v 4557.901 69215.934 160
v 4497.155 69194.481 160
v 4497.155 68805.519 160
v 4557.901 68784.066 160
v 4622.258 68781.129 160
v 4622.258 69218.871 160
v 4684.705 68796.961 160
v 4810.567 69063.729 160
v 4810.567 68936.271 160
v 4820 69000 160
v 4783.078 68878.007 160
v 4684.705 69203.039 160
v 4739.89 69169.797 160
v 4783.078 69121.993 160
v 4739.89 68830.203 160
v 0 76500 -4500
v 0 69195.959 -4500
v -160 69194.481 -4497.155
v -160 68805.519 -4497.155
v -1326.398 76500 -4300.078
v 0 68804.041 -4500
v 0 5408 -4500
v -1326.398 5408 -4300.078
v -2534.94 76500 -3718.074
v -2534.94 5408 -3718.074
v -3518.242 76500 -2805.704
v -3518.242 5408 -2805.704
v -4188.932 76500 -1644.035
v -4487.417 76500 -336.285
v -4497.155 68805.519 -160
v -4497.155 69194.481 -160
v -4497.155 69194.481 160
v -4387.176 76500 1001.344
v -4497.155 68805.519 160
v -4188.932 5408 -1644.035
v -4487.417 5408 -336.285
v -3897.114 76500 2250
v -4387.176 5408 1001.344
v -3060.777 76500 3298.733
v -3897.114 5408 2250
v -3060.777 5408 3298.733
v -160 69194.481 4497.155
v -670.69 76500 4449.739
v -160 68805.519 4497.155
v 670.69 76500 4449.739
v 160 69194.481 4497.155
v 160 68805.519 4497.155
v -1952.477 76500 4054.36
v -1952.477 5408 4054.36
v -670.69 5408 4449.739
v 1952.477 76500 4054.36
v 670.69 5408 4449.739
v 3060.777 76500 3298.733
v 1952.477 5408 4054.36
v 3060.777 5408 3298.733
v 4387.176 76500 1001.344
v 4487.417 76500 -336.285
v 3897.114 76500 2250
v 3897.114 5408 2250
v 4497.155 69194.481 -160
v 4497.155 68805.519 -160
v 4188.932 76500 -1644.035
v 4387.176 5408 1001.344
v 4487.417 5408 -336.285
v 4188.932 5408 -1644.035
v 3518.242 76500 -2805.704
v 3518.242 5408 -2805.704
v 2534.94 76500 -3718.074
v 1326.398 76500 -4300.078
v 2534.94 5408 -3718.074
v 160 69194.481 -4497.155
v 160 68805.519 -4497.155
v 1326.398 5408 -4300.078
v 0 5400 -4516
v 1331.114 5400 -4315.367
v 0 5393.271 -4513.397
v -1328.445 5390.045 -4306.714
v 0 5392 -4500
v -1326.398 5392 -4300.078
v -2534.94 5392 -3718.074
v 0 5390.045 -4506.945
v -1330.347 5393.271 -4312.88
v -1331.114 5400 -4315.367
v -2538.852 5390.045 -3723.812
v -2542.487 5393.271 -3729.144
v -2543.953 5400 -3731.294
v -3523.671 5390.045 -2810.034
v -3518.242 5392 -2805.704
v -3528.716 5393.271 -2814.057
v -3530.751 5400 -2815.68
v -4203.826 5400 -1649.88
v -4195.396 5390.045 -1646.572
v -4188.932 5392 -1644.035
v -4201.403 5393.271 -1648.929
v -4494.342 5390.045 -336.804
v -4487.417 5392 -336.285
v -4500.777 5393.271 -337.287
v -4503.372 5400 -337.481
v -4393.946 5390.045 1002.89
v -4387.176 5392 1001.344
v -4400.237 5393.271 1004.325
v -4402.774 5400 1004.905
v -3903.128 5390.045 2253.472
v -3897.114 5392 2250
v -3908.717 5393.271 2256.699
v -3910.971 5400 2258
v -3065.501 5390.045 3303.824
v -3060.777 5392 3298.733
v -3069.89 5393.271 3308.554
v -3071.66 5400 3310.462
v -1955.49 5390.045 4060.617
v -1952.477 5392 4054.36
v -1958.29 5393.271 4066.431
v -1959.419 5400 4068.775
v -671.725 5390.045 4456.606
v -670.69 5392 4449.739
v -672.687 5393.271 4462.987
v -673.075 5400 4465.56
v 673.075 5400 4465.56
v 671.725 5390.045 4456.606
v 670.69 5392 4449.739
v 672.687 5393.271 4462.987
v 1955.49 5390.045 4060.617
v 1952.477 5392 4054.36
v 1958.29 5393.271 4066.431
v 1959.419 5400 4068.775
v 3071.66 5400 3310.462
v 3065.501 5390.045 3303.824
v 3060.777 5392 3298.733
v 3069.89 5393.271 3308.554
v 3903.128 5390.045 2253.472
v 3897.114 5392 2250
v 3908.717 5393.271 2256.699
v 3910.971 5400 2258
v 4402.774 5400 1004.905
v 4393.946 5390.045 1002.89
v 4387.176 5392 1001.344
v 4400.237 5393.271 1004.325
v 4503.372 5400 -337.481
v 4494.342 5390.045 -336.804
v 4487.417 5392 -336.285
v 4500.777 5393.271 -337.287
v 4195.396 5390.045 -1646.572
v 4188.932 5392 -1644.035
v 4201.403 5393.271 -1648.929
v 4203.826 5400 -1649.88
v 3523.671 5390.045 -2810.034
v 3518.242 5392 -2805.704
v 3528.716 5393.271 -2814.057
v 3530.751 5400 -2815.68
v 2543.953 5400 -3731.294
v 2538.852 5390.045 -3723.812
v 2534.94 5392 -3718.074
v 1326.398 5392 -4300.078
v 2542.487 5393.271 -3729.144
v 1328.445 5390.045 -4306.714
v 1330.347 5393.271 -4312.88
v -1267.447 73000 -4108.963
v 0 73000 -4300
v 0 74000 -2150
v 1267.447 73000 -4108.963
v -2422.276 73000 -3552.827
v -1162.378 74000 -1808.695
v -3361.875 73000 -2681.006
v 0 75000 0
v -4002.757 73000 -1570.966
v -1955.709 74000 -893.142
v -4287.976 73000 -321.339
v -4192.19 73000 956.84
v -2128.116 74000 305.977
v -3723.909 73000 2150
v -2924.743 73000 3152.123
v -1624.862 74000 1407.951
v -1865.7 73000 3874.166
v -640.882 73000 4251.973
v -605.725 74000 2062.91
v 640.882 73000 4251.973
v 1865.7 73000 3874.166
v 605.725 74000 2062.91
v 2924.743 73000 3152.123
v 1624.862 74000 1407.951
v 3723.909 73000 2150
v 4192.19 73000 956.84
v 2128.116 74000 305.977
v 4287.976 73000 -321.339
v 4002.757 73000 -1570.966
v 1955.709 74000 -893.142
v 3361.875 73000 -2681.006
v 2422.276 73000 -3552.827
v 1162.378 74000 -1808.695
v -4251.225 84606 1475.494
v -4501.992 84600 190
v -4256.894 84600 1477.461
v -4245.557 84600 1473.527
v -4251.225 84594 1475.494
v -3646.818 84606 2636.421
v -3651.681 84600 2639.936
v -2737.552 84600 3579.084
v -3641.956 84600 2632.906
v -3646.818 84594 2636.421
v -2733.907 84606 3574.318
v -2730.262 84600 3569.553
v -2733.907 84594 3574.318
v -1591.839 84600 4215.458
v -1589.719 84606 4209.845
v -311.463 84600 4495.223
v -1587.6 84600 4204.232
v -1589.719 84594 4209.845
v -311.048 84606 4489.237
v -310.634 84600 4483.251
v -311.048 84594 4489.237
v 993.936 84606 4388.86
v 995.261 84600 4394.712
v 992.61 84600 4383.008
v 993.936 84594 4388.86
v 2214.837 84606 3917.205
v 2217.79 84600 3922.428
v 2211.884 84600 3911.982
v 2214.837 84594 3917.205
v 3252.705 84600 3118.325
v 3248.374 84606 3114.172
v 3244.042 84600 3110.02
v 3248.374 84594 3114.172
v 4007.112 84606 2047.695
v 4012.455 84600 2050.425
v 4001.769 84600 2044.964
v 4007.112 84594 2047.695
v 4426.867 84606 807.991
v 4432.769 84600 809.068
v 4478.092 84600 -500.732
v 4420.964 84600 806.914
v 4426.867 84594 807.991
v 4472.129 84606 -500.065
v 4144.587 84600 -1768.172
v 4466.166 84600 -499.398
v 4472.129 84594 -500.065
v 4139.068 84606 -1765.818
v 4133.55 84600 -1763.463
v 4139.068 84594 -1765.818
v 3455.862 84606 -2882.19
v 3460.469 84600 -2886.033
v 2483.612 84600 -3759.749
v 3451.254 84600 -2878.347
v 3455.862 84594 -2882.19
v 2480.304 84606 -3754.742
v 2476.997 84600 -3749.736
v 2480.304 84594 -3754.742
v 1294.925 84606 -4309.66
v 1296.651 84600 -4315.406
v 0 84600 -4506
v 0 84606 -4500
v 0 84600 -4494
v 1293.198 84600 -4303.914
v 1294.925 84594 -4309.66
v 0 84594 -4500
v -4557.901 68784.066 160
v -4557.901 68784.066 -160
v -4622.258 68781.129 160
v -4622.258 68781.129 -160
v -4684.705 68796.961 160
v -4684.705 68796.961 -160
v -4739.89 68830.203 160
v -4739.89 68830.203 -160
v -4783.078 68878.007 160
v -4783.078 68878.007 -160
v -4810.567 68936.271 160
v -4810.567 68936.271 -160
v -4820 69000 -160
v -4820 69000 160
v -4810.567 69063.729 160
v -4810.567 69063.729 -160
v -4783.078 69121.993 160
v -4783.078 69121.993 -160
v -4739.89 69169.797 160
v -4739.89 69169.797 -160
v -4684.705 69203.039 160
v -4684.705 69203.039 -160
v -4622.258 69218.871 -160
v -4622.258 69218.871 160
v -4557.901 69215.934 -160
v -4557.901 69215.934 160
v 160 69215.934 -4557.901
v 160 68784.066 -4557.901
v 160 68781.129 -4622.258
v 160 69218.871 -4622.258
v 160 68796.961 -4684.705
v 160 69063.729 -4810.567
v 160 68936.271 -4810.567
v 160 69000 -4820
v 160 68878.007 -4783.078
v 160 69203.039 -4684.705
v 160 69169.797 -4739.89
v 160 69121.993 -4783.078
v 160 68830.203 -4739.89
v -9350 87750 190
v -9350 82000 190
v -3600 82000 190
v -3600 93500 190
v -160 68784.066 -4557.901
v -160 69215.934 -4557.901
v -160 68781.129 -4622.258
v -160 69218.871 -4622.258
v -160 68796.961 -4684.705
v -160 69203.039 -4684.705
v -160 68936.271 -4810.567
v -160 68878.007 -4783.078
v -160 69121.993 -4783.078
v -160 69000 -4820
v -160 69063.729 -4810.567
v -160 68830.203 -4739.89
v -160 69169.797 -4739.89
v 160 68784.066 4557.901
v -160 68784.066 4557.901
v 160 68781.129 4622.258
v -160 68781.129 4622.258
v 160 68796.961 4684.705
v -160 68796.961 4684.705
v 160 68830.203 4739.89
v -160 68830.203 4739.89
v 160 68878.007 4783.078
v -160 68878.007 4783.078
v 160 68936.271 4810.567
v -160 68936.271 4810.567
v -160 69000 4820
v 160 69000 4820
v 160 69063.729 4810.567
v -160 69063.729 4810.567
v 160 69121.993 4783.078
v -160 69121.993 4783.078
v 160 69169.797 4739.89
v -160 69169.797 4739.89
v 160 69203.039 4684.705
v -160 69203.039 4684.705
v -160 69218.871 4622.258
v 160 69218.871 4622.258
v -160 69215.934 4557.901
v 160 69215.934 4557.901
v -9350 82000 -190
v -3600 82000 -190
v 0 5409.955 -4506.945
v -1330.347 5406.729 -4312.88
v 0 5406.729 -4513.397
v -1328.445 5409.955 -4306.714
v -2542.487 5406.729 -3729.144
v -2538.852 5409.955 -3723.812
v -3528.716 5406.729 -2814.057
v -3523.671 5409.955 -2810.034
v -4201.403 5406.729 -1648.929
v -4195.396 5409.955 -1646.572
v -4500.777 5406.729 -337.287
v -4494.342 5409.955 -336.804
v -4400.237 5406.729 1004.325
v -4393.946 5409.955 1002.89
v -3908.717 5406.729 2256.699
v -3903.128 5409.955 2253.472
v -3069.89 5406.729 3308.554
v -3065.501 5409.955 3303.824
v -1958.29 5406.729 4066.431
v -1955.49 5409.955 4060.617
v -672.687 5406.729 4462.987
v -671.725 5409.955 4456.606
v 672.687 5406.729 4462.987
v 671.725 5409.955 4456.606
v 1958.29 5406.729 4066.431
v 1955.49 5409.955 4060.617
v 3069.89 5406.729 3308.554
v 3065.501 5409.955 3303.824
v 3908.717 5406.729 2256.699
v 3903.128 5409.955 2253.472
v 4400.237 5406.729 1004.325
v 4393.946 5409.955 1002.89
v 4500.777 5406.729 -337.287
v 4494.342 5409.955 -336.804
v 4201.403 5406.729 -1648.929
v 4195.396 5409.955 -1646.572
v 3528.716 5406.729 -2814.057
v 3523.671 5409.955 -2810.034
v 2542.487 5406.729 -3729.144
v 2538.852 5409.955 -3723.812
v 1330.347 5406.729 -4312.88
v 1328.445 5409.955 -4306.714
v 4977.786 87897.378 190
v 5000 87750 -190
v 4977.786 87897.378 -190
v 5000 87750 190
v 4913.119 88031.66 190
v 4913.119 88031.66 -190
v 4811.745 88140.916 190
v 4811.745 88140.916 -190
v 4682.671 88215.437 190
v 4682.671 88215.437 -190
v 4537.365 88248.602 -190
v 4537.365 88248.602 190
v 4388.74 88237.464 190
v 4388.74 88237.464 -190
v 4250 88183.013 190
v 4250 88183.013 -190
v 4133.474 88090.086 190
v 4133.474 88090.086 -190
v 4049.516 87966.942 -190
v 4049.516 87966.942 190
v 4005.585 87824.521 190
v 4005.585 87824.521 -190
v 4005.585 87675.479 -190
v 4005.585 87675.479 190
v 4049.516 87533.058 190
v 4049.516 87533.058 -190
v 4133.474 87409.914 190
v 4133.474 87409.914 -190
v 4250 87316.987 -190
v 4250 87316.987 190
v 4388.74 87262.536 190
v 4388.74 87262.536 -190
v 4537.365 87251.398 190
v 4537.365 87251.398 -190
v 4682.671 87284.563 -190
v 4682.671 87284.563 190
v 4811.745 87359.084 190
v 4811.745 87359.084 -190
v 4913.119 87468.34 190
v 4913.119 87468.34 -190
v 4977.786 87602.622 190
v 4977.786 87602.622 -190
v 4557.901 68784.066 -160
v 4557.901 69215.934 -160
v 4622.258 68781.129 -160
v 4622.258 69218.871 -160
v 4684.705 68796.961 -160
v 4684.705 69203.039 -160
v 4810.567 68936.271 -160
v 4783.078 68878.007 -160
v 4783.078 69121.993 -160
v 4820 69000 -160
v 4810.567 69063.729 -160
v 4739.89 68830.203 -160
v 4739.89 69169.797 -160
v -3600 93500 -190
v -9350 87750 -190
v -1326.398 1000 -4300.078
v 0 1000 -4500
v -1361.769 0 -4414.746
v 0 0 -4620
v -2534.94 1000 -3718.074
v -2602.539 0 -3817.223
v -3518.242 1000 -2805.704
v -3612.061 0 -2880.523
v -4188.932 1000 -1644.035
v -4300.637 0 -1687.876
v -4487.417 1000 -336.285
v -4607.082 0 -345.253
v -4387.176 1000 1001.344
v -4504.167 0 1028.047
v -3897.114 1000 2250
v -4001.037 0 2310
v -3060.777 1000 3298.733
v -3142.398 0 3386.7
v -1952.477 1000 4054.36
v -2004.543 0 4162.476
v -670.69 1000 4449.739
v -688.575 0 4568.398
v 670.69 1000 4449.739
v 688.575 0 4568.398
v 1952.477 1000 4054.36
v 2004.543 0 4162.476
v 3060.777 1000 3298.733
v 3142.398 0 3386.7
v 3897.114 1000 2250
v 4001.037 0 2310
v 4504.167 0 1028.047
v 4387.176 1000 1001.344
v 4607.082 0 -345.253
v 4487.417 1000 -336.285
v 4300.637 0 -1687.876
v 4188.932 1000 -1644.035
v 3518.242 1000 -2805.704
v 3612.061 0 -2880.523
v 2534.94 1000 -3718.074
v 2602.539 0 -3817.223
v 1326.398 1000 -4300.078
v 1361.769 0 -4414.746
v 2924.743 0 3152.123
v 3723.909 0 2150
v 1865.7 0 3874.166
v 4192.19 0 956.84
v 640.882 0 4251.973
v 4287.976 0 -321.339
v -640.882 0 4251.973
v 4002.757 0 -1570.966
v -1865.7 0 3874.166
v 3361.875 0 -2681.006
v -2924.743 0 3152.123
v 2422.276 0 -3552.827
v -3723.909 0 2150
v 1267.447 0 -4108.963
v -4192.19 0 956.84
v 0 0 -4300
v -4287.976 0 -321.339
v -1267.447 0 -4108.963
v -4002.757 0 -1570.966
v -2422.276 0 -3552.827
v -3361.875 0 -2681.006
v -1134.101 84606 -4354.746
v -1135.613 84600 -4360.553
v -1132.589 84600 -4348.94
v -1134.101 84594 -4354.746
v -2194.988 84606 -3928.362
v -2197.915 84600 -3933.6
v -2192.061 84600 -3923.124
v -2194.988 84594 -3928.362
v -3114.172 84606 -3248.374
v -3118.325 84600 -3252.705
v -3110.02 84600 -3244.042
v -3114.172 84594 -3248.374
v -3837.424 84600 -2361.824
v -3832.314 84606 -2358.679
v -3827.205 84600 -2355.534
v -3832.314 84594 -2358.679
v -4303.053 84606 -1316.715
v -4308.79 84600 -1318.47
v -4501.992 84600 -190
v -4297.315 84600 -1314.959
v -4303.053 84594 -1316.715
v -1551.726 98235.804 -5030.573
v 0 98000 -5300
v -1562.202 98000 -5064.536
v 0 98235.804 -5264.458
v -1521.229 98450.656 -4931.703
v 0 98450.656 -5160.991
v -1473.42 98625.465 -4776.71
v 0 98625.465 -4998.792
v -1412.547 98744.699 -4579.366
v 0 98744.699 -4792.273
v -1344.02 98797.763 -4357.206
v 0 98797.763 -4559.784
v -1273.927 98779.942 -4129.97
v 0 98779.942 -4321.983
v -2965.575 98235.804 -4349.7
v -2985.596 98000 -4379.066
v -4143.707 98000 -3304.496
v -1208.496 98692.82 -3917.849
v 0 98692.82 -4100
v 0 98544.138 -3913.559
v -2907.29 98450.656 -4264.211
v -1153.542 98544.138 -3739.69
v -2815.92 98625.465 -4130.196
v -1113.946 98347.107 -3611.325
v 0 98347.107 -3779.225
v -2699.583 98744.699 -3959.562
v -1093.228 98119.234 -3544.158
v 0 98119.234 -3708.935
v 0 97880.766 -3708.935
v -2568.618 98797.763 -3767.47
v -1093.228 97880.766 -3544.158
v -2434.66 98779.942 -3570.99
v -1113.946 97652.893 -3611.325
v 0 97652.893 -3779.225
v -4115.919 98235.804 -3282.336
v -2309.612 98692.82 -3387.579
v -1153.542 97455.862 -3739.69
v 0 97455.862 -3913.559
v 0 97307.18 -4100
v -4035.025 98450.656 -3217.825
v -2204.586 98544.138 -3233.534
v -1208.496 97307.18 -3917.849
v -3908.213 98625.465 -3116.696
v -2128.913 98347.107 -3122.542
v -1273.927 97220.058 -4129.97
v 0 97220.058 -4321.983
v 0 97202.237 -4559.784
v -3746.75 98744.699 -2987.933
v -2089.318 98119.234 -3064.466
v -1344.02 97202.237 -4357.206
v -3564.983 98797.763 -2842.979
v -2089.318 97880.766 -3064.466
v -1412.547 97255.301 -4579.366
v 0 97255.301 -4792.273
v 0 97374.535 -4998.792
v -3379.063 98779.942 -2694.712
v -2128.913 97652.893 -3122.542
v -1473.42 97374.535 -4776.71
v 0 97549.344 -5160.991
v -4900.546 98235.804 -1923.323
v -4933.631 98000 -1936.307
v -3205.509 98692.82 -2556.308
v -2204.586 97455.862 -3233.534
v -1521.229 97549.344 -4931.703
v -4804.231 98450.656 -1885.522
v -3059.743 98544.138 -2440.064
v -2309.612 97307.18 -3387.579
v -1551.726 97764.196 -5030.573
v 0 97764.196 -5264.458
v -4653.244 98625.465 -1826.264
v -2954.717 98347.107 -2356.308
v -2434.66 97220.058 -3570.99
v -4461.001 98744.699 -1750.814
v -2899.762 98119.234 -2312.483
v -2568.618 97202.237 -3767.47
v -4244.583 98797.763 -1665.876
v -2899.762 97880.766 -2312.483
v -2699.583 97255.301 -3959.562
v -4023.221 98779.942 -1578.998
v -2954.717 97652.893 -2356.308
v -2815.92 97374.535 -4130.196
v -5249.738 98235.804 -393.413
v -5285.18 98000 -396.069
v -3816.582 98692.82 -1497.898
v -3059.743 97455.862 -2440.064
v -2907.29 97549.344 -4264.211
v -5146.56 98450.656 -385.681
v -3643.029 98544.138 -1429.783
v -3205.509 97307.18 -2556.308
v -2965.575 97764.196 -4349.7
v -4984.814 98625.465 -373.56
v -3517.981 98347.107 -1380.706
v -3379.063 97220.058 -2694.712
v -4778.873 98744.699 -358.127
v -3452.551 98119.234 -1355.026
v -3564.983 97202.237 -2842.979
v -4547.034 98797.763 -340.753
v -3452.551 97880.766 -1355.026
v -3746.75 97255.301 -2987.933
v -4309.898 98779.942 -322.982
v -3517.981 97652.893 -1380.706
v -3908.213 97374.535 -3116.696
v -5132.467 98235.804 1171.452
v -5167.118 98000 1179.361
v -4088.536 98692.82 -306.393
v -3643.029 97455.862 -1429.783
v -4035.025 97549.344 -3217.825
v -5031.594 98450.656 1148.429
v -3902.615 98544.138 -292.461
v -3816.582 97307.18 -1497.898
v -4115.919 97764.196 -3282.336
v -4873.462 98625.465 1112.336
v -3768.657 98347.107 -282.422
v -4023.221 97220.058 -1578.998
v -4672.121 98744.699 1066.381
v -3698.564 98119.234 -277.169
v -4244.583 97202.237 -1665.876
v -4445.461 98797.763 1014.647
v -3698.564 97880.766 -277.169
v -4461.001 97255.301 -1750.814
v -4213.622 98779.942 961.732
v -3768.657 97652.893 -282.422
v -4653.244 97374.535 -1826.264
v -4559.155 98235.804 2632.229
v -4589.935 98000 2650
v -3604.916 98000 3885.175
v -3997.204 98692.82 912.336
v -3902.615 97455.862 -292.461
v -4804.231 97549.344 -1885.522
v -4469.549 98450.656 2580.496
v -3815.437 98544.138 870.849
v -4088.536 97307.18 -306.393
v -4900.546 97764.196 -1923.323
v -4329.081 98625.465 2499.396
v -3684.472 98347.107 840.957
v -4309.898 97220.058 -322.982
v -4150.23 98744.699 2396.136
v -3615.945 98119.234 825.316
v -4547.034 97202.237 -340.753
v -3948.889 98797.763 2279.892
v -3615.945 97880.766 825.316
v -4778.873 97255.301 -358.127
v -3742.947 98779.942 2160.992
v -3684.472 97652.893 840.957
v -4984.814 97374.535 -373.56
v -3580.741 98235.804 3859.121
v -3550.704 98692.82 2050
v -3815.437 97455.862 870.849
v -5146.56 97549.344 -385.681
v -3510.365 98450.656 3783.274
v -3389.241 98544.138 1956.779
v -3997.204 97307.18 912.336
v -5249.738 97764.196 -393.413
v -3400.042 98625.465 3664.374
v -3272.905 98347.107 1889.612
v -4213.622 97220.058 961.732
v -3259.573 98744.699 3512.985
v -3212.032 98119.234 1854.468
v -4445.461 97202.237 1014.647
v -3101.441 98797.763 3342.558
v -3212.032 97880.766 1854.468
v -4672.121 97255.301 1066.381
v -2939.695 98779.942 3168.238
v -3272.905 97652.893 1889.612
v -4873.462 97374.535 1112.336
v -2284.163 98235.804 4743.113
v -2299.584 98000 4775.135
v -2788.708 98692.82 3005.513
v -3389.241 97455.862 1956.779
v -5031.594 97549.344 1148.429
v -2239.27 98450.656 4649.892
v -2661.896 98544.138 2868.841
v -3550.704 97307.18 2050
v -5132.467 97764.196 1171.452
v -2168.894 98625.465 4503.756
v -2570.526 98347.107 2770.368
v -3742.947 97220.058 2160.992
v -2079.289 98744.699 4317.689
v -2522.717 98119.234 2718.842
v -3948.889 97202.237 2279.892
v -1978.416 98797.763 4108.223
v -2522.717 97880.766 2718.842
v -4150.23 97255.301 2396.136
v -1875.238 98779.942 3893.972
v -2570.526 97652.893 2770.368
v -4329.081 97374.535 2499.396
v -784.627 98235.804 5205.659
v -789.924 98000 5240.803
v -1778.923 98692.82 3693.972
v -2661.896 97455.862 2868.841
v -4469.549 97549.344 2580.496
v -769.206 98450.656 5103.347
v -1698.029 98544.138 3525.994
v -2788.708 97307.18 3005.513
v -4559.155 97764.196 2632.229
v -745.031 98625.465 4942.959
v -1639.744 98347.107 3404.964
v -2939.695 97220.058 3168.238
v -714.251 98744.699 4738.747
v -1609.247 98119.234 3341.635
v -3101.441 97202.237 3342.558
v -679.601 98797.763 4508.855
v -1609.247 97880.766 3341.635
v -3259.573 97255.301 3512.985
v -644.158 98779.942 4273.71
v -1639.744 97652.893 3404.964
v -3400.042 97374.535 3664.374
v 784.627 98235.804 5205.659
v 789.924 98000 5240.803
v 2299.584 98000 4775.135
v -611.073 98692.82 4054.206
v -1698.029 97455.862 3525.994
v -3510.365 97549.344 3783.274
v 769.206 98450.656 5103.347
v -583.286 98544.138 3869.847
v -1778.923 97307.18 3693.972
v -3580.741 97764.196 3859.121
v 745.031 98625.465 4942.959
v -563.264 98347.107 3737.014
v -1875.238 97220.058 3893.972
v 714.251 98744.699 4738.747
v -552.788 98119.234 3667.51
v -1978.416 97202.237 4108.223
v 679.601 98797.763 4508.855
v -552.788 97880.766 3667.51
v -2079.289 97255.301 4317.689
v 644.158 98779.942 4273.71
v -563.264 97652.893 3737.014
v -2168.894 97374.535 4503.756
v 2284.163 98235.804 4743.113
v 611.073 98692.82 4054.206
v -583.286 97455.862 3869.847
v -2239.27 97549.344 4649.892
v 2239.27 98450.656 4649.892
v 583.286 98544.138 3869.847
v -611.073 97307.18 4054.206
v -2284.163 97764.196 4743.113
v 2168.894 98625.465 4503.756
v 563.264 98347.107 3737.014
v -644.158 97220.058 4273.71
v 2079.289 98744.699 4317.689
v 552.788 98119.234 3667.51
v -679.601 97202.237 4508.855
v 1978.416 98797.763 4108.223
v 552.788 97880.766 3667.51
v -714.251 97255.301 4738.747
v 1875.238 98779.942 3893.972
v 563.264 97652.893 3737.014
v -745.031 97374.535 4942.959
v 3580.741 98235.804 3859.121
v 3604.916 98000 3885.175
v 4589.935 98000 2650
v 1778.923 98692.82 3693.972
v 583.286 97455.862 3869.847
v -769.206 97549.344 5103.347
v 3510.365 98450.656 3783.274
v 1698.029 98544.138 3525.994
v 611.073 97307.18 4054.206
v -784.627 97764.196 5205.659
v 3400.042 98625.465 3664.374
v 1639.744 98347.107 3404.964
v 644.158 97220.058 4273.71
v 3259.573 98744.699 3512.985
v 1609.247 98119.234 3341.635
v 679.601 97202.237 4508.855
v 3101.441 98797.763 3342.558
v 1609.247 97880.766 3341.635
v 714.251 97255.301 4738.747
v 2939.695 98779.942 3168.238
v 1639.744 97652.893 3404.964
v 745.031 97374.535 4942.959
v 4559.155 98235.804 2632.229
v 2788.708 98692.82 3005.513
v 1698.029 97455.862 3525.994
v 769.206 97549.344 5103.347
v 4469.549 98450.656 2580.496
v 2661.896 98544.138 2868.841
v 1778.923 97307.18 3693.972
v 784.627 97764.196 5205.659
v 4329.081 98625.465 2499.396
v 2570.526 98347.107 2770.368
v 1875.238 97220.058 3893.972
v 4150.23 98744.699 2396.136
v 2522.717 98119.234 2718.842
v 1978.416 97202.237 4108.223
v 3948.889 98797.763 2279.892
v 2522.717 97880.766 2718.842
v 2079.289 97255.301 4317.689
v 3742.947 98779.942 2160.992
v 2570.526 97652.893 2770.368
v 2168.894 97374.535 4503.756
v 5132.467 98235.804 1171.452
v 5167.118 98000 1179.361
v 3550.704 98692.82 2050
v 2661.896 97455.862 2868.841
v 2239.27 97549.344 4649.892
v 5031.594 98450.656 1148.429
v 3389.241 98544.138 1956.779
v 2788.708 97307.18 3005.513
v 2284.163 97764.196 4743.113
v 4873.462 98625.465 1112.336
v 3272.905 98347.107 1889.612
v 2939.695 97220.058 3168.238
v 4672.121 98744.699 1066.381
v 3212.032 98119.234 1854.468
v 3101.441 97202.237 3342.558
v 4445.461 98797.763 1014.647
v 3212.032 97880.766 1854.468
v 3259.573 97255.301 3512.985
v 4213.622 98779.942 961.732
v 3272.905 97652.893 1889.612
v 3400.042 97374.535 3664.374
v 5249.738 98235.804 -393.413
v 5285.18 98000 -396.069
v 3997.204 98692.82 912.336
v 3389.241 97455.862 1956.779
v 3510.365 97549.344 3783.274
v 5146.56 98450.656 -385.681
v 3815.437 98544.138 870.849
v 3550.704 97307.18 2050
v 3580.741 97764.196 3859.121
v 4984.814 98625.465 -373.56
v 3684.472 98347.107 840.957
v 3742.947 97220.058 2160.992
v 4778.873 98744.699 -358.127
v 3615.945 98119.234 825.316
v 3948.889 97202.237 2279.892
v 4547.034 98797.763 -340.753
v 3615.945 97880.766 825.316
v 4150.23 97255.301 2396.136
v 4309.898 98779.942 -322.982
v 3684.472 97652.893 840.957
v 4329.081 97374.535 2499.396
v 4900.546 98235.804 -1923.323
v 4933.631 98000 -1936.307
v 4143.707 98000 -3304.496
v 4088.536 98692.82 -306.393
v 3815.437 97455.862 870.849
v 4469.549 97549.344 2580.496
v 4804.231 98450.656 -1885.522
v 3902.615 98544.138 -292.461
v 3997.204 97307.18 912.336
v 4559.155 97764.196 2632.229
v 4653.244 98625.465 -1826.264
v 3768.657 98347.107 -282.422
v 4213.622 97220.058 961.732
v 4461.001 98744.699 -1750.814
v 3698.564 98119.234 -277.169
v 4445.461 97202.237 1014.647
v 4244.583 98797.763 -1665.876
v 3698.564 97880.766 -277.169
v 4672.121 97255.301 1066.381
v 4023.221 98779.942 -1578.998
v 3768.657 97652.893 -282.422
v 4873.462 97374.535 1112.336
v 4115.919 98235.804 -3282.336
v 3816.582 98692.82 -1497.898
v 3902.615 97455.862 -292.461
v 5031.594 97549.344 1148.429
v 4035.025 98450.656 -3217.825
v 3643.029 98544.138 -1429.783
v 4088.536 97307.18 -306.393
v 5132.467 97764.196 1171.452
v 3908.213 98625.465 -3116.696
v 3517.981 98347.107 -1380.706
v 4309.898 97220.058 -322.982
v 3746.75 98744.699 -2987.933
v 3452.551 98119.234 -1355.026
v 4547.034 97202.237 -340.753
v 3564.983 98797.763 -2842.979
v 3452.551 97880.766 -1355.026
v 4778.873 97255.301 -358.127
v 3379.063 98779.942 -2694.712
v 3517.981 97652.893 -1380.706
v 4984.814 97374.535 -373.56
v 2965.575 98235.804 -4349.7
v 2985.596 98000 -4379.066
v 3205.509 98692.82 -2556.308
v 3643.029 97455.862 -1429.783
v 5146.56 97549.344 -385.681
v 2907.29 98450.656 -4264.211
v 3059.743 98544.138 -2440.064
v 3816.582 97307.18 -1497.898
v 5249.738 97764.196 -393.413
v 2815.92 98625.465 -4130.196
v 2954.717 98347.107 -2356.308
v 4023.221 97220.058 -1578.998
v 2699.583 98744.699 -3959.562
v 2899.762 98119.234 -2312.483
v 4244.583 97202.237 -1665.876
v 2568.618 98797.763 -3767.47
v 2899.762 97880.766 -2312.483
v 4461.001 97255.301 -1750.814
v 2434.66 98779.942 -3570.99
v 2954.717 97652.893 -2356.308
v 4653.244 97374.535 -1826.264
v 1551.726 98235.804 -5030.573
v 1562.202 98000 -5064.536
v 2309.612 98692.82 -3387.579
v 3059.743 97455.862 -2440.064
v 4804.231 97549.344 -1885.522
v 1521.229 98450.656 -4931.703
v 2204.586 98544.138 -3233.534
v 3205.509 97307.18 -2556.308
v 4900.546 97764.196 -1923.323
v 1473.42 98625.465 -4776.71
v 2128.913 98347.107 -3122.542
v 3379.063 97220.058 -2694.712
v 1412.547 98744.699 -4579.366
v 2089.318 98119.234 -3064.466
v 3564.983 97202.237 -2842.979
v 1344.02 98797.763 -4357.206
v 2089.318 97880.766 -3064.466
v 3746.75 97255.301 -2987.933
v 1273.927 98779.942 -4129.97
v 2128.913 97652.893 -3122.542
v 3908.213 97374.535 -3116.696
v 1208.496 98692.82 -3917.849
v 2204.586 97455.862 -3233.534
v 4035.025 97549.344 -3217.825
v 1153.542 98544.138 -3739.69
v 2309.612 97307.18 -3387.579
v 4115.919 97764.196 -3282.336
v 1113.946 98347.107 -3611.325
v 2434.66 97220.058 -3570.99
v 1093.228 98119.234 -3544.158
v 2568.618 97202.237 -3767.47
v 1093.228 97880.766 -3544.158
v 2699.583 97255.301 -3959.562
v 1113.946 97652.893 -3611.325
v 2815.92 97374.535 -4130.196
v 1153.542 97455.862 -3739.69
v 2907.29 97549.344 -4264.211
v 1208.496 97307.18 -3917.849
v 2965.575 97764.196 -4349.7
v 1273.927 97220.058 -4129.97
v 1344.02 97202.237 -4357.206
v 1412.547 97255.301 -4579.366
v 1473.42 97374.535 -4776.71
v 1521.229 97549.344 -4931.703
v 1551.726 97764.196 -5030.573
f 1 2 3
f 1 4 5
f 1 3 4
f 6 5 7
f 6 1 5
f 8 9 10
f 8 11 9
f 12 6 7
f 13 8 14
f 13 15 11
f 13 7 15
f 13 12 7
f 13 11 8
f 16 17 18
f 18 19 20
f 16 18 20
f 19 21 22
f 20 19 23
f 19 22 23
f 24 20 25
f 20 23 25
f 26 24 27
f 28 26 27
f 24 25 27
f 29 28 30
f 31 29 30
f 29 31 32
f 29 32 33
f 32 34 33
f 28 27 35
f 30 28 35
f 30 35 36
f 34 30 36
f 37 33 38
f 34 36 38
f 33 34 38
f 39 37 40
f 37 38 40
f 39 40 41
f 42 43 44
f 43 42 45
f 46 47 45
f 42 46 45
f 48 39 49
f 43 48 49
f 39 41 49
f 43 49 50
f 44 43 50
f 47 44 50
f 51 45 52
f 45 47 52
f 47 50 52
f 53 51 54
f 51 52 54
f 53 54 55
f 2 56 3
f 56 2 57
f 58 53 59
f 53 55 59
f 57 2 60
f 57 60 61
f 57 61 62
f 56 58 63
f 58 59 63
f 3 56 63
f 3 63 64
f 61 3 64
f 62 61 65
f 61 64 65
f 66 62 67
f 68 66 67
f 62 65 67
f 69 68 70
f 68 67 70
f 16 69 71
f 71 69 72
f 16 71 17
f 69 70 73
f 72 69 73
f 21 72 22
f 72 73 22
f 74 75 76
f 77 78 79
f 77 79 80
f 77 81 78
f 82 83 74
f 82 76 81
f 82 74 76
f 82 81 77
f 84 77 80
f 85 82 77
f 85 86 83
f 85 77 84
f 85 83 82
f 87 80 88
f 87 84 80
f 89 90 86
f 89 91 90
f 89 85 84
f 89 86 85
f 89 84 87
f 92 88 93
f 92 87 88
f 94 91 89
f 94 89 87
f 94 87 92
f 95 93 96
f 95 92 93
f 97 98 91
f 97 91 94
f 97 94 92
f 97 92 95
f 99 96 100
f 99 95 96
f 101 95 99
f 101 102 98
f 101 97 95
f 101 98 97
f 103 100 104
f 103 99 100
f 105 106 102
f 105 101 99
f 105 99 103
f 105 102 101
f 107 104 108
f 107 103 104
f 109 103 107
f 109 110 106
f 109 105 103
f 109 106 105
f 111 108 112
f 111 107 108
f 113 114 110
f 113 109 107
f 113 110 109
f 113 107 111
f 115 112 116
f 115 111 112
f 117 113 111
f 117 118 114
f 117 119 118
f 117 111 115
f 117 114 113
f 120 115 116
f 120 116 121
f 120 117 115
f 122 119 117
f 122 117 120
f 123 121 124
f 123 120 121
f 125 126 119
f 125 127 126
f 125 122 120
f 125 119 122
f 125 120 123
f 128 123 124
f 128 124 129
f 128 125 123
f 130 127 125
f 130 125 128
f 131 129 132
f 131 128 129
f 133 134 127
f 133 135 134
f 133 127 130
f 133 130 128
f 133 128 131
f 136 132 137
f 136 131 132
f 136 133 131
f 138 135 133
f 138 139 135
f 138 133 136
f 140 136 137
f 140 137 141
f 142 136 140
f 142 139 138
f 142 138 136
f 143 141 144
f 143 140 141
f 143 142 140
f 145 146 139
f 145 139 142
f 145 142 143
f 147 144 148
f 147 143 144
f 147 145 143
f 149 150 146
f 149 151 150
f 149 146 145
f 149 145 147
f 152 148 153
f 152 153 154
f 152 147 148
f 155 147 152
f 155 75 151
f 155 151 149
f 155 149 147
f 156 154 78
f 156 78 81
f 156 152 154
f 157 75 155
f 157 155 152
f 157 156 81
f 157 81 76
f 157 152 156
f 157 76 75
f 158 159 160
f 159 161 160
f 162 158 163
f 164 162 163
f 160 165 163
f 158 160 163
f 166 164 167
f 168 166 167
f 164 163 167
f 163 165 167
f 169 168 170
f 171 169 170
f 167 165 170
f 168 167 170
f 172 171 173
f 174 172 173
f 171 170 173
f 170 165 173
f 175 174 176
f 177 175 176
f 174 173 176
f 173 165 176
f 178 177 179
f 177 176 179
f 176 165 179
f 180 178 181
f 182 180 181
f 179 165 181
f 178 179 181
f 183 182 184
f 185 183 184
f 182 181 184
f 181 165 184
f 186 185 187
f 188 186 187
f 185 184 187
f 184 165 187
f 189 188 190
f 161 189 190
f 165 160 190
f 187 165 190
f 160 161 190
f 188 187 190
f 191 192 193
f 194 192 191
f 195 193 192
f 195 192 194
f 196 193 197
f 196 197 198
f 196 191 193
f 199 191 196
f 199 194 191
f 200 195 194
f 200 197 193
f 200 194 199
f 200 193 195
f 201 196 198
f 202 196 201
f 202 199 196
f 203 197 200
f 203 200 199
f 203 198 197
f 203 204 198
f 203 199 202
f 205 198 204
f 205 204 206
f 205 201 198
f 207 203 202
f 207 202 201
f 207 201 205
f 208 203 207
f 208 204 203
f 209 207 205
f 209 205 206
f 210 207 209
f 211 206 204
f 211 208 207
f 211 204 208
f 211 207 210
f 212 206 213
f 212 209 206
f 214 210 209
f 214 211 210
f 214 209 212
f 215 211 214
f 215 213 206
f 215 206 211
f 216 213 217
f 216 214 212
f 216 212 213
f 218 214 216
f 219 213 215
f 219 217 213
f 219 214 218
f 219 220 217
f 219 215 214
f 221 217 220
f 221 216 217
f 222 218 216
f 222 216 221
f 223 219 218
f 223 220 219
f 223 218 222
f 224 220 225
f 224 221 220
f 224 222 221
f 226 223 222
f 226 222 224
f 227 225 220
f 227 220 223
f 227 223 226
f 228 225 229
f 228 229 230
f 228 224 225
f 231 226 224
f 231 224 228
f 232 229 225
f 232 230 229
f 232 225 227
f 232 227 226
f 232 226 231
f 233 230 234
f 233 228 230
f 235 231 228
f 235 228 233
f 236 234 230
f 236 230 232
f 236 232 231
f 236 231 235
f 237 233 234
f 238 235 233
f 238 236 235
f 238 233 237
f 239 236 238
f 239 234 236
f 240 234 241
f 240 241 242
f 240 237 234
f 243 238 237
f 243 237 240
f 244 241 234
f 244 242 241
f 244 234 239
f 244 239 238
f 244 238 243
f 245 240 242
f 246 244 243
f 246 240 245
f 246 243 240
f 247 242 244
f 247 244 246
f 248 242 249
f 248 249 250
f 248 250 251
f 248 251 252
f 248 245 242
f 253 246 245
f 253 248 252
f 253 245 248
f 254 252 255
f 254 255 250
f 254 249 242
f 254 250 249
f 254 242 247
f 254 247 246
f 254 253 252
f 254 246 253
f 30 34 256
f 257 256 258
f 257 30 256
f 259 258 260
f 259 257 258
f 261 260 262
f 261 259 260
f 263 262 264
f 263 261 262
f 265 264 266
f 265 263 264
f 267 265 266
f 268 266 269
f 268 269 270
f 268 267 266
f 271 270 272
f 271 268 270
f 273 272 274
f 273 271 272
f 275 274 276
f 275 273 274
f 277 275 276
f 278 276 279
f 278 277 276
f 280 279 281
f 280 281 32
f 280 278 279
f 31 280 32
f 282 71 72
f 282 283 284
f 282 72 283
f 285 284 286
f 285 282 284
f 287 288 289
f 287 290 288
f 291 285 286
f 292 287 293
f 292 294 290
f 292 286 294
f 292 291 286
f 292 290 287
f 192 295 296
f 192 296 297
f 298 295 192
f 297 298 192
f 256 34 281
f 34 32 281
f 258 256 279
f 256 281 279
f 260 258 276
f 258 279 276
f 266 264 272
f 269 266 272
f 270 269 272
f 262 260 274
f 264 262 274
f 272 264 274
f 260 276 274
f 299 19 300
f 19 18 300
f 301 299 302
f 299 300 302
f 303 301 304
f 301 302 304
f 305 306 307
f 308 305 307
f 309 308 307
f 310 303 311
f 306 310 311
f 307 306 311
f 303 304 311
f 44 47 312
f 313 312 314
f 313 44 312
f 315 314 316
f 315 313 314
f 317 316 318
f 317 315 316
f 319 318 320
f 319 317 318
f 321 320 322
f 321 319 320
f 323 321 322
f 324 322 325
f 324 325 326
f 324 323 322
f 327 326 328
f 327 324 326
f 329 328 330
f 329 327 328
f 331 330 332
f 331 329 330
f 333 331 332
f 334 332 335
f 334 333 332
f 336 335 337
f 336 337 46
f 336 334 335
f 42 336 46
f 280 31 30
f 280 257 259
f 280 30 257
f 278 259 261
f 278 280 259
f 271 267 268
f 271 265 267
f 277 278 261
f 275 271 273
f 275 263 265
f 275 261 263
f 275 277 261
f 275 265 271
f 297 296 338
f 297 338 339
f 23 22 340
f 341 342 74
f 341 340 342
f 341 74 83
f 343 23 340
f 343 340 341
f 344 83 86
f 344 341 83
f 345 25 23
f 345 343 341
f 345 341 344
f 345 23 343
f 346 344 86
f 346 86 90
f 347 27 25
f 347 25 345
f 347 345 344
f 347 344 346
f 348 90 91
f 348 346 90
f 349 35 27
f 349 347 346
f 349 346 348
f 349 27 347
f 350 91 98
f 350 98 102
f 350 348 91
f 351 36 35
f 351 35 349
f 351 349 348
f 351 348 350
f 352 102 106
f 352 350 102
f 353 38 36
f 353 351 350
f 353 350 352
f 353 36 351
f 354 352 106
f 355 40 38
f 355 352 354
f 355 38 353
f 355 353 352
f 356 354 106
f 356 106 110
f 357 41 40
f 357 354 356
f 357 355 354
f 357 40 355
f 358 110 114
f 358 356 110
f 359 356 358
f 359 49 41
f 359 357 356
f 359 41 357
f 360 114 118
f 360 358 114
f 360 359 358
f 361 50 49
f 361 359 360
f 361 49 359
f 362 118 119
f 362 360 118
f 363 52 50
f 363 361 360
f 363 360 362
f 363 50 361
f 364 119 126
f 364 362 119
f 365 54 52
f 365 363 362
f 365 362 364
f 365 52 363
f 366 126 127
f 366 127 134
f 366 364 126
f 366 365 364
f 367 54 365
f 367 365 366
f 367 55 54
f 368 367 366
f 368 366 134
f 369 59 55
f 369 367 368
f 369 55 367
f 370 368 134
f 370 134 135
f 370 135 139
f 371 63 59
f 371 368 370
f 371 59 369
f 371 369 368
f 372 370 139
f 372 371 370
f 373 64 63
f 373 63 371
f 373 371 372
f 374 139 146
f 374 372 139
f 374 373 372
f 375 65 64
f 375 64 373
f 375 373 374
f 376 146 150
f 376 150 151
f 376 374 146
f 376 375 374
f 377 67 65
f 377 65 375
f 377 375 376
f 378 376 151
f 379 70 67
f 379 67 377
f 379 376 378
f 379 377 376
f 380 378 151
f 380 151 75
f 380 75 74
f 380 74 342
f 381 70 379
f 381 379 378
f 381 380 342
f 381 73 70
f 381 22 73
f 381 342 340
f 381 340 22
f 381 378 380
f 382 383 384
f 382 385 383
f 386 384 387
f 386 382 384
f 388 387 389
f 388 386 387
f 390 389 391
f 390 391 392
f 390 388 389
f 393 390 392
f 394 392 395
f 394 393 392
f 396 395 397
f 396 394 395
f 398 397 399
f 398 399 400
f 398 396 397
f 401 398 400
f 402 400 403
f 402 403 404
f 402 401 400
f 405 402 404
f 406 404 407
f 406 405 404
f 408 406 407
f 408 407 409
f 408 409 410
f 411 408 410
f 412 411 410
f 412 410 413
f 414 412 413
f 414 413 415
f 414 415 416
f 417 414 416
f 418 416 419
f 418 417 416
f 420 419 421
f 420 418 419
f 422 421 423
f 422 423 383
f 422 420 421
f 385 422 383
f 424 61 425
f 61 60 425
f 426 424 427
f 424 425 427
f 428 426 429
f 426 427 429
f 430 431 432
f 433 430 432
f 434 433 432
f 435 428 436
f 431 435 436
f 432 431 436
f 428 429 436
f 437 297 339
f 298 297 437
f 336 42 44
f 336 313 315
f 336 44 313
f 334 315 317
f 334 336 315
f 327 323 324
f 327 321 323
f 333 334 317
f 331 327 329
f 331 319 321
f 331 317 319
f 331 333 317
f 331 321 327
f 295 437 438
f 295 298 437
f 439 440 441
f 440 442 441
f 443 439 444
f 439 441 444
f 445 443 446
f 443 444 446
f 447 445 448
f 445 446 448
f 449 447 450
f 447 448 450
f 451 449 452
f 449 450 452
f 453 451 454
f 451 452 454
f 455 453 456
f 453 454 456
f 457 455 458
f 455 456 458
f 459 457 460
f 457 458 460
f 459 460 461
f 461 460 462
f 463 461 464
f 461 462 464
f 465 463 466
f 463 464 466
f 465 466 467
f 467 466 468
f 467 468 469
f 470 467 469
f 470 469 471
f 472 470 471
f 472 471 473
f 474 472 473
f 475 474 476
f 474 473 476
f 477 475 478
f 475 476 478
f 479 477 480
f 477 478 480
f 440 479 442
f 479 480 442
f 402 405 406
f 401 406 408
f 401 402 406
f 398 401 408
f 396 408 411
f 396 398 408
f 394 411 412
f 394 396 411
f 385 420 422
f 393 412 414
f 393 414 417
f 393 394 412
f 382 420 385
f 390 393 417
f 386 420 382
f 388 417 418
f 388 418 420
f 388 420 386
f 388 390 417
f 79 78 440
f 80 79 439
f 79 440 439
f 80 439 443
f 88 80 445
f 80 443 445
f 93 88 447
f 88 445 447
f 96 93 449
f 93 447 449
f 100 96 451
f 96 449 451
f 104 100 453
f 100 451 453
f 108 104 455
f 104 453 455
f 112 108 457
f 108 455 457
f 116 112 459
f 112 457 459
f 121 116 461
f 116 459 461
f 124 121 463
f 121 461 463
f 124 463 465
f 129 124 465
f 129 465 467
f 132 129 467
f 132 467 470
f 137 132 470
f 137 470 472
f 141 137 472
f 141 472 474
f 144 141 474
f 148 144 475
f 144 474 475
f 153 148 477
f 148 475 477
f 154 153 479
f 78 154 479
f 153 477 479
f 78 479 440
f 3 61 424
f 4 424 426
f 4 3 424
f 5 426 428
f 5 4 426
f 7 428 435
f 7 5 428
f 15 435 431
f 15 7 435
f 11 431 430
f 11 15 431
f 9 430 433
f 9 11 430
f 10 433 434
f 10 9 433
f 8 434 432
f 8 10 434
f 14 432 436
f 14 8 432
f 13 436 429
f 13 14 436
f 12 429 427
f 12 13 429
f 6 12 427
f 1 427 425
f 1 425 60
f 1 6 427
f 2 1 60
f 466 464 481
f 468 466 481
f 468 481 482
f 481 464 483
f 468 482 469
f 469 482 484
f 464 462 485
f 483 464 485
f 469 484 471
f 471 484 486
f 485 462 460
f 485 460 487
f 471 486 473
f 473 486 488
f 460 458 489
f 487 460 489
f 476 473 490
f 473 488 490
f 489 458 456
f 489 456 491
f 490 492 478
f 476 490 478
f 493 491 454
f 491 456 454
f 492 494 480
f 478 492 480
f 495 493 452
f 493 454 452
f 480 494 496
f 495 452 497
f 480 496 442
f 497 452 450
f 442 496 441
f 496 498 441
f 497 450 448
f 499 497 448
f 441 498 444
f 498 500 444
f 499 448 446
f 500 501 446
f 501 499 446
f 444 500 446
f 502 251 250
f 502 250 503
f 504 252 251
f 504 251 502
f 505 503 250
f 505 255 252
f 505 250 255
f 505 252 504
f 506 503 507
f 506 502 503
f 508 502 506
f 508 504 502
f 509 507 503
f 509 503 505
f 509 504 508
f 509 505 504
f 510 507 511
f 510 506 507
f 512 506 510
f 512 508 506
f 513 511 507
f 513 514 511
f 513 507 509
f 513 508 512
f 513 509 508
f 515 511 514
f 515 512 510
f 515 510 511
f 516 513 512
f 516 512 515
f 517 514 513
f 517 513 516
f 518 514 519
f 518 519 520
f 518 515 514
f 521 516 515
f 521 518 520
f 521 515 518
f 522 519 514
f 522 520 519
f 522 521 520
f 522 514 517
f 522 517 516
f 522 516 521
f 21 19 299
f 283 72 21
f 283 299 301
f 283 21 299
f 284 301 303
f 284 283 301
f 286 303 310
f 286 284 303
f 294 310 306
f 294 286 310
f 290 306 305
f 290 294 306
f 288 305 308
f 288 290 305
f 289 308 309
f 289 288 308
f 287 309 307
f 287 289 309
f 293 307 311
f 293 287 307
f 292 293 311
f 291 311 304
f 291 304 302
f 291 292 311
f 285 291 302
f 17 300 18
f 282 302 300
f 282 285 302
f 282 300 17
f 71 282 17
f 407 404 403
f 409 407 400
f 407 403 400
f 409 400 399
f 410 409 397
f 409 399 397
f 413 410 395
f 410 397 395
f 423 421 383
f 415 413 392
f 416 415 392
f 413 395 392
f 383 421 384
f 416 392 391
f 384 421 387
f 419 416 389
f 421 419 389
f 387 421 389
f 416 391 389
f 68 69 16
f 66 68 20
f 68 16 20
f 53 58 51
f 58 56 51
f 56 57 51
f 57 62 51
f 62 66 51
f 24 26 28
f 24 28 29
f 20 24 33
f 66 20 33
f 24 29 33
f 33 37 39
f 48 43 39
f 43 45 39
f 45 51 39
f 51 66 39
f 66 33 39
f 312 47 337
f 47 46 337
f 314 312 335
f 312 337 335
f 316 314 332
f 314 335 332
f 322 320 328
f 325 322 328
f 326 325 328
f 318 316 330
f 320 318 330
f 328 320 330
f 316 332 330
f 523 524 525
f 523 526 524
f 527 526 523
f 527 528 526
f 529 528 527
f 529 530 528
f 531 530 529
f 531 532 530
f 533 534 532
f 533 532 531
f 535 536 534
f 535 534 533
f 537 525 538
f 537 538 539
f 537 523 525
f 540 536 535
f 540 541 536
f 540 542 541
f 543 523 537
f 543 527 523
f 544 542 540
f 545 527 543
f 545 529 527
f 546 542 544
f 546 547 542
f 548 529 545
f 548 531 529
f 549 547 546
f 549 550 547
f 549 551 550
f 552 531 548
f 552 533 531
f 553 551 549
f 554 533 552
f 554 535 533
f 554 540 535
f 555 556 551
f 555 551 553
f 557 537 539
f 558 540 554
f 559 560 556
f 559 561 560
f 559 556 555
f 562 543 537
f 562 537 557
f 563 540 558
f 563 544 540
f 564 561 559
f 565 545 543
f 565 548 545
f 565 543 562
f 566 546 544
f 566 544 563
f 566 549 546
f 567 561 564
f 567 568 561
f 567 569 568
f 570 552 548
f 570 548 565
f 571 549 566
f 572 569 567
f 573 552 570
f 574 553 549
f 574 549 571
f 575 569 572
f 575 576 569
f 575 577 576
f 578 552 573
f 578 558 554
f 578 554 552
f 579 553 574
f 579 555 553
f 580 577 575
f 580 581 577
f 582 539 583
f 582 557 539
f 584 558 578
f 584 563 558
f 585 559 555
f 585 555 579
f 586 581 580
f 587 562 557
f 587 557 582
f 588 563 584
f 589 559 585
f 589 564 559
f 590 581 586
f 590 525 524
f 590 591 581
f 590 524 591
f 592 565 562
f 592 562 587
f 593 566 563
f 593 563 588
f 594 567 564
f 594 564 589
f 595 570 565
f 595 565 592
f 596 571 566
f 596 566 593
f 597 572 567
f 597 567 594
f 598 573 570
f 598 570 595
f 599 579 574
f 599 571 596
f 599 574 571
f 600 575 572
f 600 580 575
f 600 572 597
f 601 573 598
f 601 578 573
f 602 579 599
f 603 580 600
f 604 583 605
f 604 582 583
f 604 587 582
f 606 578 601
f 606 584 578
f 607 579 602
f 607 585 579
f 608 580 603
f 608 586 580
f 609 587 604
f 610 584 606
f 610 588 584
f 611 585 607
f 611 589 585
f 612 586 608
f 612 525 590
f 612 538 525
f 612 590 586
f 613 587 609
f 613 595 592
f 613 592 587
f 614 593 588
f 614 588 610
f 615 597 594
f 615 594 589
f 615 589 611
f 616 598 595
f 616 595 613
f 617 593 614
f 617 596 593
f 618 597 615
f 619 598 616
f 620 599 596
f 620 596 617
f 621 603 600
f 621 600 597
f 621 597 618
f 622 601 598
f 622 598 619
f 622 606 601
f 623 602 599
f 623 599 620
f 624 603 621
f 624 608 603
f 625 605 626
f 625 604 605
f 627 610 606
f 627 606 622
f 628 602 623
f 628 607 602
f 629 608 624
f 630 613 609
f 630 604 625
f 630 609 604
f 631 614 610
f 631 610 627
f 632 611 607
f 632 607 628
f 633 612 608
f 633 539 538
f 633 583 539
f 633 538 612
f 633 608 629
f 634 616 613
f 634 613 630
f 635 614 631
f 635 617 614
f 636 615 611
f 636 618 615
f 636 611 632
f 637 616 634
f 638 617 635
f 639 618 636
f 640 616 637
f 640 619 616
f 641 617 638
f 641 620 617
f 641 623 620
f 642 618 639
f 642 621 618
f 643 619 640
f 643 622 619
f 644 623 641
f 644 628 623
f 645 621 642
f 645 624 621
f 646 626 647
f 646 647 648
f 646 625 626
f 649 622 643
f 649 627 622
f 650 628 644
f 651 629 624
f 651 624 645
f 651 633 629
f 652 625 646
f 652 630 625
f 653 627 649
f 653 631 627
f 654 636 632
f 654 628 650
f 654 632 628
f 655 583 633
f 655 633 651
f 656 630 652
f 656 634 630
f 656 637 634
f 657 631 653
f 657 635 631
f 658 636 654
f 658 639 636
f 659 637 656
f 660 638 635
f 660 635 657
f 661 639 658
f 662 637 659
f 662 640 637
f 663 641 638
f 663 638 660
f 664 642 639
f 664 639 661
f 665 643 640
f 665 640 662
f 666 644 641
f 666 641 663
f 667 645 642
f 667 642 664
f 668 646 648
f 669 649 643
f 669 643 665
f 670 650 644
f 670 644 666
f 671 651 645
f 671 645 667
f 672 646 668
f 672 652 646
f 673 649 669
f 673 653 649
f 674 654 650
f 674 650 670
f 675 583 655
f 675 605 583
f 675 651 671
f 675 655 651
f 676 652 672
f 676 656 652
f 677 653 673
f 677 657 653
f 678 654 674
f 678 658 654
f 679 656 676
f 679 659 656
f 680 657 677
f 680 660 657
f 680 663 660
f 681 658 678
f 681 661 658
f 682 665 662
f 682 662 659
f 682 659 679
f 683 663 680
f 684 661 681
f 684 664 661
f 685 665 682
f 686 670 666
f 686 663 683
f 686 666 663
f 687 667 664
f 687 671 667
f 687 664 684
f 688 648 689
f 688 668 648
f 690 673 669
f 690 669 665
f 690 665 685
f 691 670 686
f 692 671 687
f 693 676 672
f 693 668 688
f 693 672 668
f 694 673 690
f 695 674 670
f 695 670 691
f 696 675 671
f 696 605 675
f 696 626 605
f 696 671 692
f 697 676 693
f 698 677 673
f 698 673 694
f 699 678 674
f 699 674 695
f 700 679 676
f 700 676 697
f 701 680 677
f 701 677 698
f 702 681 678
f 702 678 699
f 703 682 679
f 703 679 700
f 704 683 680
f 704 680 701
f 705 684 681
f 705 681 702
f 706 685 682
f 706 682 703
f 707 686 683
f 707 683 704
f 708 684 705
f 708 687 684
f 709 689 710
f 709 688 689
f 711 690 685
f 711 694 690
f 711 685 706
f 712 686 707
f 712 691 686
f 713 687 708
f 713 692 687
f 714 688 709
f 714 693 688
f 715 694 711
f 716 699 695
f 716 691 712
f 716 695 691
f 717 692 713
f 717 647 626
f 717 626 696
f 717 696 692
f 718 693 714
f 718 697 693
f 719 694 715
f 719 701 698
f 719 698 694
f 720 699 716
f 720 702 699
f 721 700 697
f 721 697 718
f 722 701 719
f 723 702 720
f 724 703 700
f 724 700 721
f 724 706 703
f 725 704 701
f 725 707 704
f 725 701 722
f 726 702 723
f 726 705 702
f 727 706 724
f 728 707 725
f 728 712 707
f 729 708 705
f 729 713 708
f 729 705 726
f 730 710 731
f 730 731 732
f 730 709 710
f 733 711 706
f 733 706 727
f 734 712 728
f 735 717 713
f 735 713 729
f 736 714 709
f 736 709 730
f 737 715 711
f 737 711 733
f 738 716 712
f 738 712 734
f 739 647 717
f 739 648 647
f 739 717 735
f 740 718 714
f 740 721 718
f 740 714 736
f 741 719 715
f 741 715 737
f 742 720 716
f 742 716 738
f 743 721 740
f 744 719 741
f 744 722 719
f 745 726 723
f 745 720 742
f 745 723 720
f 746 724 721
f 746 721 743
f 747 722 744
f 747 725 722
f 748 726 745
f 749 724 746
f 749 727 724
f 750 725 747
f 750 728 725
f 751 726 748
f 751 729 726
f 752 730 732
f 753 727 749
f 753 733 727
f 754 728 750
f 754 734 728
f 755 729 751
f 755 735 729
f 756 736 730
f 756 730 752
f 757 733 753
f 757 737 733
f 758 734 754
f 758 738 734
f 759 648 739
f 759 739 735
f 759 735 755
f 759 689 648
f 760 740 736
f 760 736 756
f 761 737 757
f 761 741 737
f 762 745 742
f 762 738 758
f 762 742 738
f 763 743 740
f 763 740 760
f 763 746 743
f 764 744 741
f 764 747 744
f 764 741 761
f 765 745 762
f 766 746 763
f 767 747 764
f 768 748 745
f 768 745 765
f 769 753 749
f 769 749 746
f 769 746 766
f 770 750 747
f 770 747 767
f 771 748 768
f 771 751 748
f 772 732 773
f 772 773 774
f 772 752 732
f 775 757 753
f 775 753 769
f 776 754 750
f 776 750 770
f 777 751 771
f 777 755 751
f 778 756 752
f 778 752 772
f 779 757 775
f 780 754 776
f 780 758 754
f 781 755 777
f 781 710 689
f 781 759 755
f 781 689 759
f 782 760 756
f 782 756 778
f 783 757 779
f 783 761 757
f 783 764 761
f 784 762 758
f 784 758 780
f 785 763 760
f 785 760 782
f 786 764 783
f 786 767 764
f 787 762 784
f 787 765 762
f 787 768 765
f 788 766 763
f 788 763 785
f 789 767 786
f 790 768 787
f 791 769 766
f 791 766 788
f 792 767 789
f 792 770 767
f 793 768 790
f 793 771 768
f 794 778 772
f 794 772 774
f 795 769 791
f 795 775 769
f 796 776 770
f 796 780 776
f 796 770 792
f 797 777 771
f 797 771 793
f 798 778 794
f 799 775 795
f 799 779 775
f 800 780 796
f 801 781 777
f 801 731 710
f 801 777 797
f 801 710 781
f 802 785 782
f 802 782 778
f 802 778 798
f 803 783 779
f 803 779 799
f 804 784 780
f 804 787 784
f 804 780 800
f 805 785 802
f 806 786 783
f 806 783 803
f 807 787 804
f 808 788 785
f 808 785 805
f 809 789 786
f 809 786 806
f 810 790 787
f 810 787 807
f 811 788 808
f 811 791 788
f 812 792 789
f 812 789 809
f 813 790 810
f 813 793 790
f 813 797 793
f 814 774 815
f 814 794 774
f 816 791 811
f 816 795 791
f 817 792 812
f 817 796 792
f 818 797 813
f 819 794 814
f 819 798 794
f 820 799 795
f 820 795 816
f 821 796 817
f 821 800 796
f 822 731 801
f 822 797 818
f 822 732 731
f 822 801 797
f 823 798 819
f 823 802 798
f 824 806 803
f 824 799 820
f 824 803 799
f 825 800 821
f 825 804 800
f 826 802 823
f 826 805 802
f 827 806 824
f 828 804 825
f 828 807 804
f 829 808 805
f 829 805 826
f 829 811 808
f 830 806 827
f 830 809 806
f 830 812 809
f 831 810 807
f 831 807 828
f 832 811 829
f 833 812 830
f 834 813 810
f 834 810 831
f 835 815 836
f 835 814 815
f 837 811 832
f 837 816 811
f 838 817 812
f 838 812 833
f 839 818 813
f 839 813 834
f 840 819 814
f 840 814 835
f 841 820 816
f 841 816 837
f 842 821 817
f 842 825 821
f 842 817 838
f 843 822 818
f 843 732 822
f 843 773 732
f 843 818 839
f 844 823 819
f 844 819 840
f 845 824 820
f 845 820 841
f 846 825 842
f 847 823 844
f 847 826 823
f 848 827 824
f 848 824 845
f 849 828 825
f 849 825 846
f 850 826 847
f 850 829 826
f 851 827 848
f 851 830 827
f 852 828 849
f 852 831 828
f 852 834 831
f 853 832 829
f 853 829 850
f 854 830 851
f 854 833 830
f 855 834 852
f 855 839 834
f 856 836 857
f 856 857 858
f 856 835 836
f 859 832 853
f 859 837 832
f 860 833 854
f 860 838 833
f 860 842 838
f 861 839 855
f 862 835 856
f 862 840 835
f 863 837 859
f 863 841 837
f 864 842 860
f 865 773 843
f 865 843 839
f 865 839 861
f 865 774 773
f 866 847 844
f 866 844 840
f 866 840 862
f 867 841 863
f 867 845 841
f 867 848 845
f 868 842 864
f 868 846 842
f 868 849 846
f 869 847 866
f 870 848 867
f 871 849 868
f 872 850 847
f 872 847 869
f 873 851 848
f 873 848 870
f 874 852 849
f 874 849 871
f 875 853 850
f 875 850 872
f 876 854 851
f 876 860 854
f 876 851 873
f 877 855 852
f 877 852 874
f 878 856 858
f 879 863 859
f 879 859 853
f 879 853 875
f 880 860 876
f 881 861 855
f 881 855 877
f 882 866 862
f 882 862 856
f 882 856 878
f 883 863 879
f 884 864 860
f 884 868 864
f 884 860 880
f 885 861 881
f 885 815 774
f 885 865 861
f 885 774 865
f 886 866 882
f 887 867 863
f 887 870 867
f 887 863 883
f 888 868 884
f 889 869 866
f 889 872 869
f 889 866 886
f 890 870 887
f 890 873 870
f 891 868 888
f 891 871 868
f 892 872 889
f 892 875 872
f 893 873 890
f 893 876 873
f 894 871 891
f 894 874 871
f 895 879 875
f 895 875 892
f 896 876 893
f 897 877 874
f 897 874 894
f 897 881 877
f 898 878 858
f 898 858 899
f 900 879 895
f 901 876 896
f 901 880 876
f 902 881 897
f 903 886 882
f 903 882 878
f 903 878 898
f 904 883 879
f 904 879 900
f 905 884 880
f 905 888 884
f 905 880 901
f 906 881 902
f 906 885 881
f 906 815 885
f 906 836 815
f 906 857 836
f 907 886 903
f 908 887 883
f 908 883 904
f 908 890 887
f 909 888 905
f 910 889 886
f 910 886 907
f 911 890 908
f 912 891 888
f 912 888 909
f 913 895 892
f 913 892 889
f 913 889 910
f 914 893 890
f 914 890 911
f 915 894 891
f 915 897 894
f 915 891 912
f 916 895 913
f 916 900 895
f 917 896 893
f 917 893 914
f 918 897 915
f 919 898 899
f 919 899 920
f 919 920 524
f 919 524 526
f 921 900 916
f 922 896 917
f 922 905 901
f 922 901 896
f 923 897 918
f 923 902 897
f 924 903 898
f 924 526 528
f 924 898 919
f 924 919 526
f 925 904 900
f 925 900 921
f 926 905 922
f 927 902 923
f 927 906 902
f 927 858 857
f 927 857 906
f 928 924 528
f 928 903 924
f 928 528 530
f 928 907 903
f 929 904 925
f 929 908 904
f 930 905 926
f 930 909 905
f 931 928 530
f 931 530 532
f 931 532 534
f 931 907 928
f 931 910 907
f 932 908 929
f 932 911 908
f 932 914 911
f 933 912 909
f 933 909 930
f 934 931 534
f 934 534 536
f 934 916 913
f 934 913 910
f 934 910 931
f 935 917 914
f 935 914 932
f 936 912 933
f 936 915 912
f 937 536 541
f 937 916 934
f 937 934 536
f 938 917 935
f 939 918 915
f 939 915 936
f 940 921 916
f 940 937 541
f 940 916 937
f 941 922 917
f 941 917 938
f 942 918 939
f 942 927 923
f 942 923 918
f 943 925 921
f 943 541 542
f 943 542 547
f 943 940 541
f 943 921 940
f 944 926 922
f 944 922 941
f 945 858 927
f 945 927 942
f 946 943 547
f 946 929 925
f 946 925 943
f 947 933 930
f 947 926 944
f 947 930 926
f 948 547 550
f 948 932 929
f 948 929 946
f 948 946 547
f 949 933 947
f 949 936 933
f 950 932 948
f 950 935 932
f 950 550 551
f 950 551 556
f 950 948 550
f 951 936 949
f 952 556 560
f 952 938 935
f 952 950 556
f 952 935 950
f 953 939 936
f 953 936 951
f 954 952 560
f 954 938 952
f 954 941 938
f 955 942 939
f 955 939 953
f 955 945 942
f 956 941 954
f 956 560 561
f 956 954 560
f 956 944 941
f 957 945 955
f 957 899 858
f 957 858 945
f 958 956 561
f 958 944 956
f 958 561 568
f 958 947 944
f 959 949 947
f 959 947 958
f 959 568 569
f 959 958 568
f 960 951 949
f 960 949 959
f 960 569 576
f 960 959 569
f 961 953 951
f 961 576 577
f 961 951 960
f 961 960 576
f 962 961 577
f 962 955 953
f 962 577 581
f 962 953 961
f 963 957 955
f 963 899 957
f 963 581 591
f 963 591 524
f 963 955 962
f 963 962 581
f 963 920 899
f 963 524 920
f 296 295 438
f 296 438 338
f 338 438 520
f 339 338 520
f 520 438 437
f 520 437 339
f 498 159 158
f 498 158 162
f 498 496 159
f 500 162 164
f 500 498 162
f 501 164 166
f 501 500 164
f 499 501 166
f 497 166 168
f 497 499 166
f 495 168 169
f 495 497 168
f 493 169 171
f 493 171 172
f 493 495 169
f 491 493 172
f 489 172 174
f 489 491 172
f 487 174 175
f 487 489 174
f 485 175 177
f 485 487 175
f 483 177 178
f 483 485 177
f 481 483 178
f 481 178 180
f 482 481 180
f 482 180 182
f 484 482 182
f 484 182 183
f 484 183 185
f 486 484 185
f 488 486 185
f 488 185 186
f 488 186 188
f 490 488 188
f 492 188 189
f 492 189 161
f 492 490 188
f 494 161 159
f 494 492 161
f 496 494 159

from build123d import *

# Parameters (mm, degrees)
SKETCH6_R             = 220
BOSS_EXTRUDE1_DEPTH   = 160
CIRPATTERN1_COUNT     = 4
SKETCH8_R             = 500
BOSS_EXTRUDE2_DEPTH   = 190
BOSS_EXTRUDE2_2_DEPTH = 190
SKETCH10_R            = 10
SKETCH10_R_2          = 6
SKETCH10_R_3          = 800


with BuildPart() as part:
    # Sketch1 → Revolve1 (revolve)
    with BuildSketch(Plane.XY, mode=Mode.PRIVATE) as revolve1_sk:
        Polygon((0, 76500), (4500, 76500), (4500, 1000), (4620, 0), (4300, 0), (4300, 1500), (4300, 73000), (0, 75000), align=None)
    revolve(revolve1_sk.sketch.rotate(Axis((0, 0, 0), (0, 1, 0)), 90), axis=Axis((0, 0, 0), (0, 1, 0)))

    # Sketch6 → Boss-Extrude1 (add, symmetric)
    with BuildSketch(Plane.XY):
        with Locations((4600, 69000)):
            Circle(SKETCH6_R)
    boss_extrude1 = extrude(amount=BOSS_EXTRUDE1_DEPTH, both=True)

    # CirPattern1: Boss-Extrude1 ×4 about axis
    cirpattern1_axis = Axis((0, 0, 0), (0, 1, 0))
    for i in range(1, CIRPATTERN1_COUNT):
        add(boss_extrude1.rotate(cirpattern1_axis, i * 360 / CIRPATTERN1_COUNT))



with BuildPart() as body_2:
    # Sketch8 → Boss-Extrude2 (new, symmetric)
    with BuildSketch(Plane.XY):
        with Locations((4500, 87750)):
            Circle(SKETCH8_R)
    extrude(amount=BOSS_EXTRUDE2_DEPTH, both=True)


with BuildPart() as body_3:
    # Sketch8 → Boss-Extrude2 2 (new, symmetric)
    with BuildSketch(Plane.XY):
        Polygon((-3600, 93500), (-9350, 87750), (-9350, 82000), (-3600, 82000), align=None)
    extrude(amount=BOSS_EXTRUDE2_2_DEPTH, both=True)


with BuildPart() as part_1:
    add(part.part)

    add(body_3.part)  # Revolve6 merges body 3
    # Sketch10 → Revolve6 (revolve)
    with BuildSketch(Plane.XY, mode=Mode.PRIVATE) as revolve6_sk:
        with Locations((4506, 5400)):
            Circle(SKETCH10_R)
        with Locations((4500, 84600)):
            Circle(SKETCH10_R_2)
        with Locations((4500, 98000)):
            Circle(SKETCH10_R_3)
    revolve(revolve6_sk.sketch.rotate(Axis((0, 0, 0), (0, 1, 0)), 90), axis=Axis((0, 0, 0), (0, 1, 0)))


solid = Compound([body_2.part, part_1.part])
